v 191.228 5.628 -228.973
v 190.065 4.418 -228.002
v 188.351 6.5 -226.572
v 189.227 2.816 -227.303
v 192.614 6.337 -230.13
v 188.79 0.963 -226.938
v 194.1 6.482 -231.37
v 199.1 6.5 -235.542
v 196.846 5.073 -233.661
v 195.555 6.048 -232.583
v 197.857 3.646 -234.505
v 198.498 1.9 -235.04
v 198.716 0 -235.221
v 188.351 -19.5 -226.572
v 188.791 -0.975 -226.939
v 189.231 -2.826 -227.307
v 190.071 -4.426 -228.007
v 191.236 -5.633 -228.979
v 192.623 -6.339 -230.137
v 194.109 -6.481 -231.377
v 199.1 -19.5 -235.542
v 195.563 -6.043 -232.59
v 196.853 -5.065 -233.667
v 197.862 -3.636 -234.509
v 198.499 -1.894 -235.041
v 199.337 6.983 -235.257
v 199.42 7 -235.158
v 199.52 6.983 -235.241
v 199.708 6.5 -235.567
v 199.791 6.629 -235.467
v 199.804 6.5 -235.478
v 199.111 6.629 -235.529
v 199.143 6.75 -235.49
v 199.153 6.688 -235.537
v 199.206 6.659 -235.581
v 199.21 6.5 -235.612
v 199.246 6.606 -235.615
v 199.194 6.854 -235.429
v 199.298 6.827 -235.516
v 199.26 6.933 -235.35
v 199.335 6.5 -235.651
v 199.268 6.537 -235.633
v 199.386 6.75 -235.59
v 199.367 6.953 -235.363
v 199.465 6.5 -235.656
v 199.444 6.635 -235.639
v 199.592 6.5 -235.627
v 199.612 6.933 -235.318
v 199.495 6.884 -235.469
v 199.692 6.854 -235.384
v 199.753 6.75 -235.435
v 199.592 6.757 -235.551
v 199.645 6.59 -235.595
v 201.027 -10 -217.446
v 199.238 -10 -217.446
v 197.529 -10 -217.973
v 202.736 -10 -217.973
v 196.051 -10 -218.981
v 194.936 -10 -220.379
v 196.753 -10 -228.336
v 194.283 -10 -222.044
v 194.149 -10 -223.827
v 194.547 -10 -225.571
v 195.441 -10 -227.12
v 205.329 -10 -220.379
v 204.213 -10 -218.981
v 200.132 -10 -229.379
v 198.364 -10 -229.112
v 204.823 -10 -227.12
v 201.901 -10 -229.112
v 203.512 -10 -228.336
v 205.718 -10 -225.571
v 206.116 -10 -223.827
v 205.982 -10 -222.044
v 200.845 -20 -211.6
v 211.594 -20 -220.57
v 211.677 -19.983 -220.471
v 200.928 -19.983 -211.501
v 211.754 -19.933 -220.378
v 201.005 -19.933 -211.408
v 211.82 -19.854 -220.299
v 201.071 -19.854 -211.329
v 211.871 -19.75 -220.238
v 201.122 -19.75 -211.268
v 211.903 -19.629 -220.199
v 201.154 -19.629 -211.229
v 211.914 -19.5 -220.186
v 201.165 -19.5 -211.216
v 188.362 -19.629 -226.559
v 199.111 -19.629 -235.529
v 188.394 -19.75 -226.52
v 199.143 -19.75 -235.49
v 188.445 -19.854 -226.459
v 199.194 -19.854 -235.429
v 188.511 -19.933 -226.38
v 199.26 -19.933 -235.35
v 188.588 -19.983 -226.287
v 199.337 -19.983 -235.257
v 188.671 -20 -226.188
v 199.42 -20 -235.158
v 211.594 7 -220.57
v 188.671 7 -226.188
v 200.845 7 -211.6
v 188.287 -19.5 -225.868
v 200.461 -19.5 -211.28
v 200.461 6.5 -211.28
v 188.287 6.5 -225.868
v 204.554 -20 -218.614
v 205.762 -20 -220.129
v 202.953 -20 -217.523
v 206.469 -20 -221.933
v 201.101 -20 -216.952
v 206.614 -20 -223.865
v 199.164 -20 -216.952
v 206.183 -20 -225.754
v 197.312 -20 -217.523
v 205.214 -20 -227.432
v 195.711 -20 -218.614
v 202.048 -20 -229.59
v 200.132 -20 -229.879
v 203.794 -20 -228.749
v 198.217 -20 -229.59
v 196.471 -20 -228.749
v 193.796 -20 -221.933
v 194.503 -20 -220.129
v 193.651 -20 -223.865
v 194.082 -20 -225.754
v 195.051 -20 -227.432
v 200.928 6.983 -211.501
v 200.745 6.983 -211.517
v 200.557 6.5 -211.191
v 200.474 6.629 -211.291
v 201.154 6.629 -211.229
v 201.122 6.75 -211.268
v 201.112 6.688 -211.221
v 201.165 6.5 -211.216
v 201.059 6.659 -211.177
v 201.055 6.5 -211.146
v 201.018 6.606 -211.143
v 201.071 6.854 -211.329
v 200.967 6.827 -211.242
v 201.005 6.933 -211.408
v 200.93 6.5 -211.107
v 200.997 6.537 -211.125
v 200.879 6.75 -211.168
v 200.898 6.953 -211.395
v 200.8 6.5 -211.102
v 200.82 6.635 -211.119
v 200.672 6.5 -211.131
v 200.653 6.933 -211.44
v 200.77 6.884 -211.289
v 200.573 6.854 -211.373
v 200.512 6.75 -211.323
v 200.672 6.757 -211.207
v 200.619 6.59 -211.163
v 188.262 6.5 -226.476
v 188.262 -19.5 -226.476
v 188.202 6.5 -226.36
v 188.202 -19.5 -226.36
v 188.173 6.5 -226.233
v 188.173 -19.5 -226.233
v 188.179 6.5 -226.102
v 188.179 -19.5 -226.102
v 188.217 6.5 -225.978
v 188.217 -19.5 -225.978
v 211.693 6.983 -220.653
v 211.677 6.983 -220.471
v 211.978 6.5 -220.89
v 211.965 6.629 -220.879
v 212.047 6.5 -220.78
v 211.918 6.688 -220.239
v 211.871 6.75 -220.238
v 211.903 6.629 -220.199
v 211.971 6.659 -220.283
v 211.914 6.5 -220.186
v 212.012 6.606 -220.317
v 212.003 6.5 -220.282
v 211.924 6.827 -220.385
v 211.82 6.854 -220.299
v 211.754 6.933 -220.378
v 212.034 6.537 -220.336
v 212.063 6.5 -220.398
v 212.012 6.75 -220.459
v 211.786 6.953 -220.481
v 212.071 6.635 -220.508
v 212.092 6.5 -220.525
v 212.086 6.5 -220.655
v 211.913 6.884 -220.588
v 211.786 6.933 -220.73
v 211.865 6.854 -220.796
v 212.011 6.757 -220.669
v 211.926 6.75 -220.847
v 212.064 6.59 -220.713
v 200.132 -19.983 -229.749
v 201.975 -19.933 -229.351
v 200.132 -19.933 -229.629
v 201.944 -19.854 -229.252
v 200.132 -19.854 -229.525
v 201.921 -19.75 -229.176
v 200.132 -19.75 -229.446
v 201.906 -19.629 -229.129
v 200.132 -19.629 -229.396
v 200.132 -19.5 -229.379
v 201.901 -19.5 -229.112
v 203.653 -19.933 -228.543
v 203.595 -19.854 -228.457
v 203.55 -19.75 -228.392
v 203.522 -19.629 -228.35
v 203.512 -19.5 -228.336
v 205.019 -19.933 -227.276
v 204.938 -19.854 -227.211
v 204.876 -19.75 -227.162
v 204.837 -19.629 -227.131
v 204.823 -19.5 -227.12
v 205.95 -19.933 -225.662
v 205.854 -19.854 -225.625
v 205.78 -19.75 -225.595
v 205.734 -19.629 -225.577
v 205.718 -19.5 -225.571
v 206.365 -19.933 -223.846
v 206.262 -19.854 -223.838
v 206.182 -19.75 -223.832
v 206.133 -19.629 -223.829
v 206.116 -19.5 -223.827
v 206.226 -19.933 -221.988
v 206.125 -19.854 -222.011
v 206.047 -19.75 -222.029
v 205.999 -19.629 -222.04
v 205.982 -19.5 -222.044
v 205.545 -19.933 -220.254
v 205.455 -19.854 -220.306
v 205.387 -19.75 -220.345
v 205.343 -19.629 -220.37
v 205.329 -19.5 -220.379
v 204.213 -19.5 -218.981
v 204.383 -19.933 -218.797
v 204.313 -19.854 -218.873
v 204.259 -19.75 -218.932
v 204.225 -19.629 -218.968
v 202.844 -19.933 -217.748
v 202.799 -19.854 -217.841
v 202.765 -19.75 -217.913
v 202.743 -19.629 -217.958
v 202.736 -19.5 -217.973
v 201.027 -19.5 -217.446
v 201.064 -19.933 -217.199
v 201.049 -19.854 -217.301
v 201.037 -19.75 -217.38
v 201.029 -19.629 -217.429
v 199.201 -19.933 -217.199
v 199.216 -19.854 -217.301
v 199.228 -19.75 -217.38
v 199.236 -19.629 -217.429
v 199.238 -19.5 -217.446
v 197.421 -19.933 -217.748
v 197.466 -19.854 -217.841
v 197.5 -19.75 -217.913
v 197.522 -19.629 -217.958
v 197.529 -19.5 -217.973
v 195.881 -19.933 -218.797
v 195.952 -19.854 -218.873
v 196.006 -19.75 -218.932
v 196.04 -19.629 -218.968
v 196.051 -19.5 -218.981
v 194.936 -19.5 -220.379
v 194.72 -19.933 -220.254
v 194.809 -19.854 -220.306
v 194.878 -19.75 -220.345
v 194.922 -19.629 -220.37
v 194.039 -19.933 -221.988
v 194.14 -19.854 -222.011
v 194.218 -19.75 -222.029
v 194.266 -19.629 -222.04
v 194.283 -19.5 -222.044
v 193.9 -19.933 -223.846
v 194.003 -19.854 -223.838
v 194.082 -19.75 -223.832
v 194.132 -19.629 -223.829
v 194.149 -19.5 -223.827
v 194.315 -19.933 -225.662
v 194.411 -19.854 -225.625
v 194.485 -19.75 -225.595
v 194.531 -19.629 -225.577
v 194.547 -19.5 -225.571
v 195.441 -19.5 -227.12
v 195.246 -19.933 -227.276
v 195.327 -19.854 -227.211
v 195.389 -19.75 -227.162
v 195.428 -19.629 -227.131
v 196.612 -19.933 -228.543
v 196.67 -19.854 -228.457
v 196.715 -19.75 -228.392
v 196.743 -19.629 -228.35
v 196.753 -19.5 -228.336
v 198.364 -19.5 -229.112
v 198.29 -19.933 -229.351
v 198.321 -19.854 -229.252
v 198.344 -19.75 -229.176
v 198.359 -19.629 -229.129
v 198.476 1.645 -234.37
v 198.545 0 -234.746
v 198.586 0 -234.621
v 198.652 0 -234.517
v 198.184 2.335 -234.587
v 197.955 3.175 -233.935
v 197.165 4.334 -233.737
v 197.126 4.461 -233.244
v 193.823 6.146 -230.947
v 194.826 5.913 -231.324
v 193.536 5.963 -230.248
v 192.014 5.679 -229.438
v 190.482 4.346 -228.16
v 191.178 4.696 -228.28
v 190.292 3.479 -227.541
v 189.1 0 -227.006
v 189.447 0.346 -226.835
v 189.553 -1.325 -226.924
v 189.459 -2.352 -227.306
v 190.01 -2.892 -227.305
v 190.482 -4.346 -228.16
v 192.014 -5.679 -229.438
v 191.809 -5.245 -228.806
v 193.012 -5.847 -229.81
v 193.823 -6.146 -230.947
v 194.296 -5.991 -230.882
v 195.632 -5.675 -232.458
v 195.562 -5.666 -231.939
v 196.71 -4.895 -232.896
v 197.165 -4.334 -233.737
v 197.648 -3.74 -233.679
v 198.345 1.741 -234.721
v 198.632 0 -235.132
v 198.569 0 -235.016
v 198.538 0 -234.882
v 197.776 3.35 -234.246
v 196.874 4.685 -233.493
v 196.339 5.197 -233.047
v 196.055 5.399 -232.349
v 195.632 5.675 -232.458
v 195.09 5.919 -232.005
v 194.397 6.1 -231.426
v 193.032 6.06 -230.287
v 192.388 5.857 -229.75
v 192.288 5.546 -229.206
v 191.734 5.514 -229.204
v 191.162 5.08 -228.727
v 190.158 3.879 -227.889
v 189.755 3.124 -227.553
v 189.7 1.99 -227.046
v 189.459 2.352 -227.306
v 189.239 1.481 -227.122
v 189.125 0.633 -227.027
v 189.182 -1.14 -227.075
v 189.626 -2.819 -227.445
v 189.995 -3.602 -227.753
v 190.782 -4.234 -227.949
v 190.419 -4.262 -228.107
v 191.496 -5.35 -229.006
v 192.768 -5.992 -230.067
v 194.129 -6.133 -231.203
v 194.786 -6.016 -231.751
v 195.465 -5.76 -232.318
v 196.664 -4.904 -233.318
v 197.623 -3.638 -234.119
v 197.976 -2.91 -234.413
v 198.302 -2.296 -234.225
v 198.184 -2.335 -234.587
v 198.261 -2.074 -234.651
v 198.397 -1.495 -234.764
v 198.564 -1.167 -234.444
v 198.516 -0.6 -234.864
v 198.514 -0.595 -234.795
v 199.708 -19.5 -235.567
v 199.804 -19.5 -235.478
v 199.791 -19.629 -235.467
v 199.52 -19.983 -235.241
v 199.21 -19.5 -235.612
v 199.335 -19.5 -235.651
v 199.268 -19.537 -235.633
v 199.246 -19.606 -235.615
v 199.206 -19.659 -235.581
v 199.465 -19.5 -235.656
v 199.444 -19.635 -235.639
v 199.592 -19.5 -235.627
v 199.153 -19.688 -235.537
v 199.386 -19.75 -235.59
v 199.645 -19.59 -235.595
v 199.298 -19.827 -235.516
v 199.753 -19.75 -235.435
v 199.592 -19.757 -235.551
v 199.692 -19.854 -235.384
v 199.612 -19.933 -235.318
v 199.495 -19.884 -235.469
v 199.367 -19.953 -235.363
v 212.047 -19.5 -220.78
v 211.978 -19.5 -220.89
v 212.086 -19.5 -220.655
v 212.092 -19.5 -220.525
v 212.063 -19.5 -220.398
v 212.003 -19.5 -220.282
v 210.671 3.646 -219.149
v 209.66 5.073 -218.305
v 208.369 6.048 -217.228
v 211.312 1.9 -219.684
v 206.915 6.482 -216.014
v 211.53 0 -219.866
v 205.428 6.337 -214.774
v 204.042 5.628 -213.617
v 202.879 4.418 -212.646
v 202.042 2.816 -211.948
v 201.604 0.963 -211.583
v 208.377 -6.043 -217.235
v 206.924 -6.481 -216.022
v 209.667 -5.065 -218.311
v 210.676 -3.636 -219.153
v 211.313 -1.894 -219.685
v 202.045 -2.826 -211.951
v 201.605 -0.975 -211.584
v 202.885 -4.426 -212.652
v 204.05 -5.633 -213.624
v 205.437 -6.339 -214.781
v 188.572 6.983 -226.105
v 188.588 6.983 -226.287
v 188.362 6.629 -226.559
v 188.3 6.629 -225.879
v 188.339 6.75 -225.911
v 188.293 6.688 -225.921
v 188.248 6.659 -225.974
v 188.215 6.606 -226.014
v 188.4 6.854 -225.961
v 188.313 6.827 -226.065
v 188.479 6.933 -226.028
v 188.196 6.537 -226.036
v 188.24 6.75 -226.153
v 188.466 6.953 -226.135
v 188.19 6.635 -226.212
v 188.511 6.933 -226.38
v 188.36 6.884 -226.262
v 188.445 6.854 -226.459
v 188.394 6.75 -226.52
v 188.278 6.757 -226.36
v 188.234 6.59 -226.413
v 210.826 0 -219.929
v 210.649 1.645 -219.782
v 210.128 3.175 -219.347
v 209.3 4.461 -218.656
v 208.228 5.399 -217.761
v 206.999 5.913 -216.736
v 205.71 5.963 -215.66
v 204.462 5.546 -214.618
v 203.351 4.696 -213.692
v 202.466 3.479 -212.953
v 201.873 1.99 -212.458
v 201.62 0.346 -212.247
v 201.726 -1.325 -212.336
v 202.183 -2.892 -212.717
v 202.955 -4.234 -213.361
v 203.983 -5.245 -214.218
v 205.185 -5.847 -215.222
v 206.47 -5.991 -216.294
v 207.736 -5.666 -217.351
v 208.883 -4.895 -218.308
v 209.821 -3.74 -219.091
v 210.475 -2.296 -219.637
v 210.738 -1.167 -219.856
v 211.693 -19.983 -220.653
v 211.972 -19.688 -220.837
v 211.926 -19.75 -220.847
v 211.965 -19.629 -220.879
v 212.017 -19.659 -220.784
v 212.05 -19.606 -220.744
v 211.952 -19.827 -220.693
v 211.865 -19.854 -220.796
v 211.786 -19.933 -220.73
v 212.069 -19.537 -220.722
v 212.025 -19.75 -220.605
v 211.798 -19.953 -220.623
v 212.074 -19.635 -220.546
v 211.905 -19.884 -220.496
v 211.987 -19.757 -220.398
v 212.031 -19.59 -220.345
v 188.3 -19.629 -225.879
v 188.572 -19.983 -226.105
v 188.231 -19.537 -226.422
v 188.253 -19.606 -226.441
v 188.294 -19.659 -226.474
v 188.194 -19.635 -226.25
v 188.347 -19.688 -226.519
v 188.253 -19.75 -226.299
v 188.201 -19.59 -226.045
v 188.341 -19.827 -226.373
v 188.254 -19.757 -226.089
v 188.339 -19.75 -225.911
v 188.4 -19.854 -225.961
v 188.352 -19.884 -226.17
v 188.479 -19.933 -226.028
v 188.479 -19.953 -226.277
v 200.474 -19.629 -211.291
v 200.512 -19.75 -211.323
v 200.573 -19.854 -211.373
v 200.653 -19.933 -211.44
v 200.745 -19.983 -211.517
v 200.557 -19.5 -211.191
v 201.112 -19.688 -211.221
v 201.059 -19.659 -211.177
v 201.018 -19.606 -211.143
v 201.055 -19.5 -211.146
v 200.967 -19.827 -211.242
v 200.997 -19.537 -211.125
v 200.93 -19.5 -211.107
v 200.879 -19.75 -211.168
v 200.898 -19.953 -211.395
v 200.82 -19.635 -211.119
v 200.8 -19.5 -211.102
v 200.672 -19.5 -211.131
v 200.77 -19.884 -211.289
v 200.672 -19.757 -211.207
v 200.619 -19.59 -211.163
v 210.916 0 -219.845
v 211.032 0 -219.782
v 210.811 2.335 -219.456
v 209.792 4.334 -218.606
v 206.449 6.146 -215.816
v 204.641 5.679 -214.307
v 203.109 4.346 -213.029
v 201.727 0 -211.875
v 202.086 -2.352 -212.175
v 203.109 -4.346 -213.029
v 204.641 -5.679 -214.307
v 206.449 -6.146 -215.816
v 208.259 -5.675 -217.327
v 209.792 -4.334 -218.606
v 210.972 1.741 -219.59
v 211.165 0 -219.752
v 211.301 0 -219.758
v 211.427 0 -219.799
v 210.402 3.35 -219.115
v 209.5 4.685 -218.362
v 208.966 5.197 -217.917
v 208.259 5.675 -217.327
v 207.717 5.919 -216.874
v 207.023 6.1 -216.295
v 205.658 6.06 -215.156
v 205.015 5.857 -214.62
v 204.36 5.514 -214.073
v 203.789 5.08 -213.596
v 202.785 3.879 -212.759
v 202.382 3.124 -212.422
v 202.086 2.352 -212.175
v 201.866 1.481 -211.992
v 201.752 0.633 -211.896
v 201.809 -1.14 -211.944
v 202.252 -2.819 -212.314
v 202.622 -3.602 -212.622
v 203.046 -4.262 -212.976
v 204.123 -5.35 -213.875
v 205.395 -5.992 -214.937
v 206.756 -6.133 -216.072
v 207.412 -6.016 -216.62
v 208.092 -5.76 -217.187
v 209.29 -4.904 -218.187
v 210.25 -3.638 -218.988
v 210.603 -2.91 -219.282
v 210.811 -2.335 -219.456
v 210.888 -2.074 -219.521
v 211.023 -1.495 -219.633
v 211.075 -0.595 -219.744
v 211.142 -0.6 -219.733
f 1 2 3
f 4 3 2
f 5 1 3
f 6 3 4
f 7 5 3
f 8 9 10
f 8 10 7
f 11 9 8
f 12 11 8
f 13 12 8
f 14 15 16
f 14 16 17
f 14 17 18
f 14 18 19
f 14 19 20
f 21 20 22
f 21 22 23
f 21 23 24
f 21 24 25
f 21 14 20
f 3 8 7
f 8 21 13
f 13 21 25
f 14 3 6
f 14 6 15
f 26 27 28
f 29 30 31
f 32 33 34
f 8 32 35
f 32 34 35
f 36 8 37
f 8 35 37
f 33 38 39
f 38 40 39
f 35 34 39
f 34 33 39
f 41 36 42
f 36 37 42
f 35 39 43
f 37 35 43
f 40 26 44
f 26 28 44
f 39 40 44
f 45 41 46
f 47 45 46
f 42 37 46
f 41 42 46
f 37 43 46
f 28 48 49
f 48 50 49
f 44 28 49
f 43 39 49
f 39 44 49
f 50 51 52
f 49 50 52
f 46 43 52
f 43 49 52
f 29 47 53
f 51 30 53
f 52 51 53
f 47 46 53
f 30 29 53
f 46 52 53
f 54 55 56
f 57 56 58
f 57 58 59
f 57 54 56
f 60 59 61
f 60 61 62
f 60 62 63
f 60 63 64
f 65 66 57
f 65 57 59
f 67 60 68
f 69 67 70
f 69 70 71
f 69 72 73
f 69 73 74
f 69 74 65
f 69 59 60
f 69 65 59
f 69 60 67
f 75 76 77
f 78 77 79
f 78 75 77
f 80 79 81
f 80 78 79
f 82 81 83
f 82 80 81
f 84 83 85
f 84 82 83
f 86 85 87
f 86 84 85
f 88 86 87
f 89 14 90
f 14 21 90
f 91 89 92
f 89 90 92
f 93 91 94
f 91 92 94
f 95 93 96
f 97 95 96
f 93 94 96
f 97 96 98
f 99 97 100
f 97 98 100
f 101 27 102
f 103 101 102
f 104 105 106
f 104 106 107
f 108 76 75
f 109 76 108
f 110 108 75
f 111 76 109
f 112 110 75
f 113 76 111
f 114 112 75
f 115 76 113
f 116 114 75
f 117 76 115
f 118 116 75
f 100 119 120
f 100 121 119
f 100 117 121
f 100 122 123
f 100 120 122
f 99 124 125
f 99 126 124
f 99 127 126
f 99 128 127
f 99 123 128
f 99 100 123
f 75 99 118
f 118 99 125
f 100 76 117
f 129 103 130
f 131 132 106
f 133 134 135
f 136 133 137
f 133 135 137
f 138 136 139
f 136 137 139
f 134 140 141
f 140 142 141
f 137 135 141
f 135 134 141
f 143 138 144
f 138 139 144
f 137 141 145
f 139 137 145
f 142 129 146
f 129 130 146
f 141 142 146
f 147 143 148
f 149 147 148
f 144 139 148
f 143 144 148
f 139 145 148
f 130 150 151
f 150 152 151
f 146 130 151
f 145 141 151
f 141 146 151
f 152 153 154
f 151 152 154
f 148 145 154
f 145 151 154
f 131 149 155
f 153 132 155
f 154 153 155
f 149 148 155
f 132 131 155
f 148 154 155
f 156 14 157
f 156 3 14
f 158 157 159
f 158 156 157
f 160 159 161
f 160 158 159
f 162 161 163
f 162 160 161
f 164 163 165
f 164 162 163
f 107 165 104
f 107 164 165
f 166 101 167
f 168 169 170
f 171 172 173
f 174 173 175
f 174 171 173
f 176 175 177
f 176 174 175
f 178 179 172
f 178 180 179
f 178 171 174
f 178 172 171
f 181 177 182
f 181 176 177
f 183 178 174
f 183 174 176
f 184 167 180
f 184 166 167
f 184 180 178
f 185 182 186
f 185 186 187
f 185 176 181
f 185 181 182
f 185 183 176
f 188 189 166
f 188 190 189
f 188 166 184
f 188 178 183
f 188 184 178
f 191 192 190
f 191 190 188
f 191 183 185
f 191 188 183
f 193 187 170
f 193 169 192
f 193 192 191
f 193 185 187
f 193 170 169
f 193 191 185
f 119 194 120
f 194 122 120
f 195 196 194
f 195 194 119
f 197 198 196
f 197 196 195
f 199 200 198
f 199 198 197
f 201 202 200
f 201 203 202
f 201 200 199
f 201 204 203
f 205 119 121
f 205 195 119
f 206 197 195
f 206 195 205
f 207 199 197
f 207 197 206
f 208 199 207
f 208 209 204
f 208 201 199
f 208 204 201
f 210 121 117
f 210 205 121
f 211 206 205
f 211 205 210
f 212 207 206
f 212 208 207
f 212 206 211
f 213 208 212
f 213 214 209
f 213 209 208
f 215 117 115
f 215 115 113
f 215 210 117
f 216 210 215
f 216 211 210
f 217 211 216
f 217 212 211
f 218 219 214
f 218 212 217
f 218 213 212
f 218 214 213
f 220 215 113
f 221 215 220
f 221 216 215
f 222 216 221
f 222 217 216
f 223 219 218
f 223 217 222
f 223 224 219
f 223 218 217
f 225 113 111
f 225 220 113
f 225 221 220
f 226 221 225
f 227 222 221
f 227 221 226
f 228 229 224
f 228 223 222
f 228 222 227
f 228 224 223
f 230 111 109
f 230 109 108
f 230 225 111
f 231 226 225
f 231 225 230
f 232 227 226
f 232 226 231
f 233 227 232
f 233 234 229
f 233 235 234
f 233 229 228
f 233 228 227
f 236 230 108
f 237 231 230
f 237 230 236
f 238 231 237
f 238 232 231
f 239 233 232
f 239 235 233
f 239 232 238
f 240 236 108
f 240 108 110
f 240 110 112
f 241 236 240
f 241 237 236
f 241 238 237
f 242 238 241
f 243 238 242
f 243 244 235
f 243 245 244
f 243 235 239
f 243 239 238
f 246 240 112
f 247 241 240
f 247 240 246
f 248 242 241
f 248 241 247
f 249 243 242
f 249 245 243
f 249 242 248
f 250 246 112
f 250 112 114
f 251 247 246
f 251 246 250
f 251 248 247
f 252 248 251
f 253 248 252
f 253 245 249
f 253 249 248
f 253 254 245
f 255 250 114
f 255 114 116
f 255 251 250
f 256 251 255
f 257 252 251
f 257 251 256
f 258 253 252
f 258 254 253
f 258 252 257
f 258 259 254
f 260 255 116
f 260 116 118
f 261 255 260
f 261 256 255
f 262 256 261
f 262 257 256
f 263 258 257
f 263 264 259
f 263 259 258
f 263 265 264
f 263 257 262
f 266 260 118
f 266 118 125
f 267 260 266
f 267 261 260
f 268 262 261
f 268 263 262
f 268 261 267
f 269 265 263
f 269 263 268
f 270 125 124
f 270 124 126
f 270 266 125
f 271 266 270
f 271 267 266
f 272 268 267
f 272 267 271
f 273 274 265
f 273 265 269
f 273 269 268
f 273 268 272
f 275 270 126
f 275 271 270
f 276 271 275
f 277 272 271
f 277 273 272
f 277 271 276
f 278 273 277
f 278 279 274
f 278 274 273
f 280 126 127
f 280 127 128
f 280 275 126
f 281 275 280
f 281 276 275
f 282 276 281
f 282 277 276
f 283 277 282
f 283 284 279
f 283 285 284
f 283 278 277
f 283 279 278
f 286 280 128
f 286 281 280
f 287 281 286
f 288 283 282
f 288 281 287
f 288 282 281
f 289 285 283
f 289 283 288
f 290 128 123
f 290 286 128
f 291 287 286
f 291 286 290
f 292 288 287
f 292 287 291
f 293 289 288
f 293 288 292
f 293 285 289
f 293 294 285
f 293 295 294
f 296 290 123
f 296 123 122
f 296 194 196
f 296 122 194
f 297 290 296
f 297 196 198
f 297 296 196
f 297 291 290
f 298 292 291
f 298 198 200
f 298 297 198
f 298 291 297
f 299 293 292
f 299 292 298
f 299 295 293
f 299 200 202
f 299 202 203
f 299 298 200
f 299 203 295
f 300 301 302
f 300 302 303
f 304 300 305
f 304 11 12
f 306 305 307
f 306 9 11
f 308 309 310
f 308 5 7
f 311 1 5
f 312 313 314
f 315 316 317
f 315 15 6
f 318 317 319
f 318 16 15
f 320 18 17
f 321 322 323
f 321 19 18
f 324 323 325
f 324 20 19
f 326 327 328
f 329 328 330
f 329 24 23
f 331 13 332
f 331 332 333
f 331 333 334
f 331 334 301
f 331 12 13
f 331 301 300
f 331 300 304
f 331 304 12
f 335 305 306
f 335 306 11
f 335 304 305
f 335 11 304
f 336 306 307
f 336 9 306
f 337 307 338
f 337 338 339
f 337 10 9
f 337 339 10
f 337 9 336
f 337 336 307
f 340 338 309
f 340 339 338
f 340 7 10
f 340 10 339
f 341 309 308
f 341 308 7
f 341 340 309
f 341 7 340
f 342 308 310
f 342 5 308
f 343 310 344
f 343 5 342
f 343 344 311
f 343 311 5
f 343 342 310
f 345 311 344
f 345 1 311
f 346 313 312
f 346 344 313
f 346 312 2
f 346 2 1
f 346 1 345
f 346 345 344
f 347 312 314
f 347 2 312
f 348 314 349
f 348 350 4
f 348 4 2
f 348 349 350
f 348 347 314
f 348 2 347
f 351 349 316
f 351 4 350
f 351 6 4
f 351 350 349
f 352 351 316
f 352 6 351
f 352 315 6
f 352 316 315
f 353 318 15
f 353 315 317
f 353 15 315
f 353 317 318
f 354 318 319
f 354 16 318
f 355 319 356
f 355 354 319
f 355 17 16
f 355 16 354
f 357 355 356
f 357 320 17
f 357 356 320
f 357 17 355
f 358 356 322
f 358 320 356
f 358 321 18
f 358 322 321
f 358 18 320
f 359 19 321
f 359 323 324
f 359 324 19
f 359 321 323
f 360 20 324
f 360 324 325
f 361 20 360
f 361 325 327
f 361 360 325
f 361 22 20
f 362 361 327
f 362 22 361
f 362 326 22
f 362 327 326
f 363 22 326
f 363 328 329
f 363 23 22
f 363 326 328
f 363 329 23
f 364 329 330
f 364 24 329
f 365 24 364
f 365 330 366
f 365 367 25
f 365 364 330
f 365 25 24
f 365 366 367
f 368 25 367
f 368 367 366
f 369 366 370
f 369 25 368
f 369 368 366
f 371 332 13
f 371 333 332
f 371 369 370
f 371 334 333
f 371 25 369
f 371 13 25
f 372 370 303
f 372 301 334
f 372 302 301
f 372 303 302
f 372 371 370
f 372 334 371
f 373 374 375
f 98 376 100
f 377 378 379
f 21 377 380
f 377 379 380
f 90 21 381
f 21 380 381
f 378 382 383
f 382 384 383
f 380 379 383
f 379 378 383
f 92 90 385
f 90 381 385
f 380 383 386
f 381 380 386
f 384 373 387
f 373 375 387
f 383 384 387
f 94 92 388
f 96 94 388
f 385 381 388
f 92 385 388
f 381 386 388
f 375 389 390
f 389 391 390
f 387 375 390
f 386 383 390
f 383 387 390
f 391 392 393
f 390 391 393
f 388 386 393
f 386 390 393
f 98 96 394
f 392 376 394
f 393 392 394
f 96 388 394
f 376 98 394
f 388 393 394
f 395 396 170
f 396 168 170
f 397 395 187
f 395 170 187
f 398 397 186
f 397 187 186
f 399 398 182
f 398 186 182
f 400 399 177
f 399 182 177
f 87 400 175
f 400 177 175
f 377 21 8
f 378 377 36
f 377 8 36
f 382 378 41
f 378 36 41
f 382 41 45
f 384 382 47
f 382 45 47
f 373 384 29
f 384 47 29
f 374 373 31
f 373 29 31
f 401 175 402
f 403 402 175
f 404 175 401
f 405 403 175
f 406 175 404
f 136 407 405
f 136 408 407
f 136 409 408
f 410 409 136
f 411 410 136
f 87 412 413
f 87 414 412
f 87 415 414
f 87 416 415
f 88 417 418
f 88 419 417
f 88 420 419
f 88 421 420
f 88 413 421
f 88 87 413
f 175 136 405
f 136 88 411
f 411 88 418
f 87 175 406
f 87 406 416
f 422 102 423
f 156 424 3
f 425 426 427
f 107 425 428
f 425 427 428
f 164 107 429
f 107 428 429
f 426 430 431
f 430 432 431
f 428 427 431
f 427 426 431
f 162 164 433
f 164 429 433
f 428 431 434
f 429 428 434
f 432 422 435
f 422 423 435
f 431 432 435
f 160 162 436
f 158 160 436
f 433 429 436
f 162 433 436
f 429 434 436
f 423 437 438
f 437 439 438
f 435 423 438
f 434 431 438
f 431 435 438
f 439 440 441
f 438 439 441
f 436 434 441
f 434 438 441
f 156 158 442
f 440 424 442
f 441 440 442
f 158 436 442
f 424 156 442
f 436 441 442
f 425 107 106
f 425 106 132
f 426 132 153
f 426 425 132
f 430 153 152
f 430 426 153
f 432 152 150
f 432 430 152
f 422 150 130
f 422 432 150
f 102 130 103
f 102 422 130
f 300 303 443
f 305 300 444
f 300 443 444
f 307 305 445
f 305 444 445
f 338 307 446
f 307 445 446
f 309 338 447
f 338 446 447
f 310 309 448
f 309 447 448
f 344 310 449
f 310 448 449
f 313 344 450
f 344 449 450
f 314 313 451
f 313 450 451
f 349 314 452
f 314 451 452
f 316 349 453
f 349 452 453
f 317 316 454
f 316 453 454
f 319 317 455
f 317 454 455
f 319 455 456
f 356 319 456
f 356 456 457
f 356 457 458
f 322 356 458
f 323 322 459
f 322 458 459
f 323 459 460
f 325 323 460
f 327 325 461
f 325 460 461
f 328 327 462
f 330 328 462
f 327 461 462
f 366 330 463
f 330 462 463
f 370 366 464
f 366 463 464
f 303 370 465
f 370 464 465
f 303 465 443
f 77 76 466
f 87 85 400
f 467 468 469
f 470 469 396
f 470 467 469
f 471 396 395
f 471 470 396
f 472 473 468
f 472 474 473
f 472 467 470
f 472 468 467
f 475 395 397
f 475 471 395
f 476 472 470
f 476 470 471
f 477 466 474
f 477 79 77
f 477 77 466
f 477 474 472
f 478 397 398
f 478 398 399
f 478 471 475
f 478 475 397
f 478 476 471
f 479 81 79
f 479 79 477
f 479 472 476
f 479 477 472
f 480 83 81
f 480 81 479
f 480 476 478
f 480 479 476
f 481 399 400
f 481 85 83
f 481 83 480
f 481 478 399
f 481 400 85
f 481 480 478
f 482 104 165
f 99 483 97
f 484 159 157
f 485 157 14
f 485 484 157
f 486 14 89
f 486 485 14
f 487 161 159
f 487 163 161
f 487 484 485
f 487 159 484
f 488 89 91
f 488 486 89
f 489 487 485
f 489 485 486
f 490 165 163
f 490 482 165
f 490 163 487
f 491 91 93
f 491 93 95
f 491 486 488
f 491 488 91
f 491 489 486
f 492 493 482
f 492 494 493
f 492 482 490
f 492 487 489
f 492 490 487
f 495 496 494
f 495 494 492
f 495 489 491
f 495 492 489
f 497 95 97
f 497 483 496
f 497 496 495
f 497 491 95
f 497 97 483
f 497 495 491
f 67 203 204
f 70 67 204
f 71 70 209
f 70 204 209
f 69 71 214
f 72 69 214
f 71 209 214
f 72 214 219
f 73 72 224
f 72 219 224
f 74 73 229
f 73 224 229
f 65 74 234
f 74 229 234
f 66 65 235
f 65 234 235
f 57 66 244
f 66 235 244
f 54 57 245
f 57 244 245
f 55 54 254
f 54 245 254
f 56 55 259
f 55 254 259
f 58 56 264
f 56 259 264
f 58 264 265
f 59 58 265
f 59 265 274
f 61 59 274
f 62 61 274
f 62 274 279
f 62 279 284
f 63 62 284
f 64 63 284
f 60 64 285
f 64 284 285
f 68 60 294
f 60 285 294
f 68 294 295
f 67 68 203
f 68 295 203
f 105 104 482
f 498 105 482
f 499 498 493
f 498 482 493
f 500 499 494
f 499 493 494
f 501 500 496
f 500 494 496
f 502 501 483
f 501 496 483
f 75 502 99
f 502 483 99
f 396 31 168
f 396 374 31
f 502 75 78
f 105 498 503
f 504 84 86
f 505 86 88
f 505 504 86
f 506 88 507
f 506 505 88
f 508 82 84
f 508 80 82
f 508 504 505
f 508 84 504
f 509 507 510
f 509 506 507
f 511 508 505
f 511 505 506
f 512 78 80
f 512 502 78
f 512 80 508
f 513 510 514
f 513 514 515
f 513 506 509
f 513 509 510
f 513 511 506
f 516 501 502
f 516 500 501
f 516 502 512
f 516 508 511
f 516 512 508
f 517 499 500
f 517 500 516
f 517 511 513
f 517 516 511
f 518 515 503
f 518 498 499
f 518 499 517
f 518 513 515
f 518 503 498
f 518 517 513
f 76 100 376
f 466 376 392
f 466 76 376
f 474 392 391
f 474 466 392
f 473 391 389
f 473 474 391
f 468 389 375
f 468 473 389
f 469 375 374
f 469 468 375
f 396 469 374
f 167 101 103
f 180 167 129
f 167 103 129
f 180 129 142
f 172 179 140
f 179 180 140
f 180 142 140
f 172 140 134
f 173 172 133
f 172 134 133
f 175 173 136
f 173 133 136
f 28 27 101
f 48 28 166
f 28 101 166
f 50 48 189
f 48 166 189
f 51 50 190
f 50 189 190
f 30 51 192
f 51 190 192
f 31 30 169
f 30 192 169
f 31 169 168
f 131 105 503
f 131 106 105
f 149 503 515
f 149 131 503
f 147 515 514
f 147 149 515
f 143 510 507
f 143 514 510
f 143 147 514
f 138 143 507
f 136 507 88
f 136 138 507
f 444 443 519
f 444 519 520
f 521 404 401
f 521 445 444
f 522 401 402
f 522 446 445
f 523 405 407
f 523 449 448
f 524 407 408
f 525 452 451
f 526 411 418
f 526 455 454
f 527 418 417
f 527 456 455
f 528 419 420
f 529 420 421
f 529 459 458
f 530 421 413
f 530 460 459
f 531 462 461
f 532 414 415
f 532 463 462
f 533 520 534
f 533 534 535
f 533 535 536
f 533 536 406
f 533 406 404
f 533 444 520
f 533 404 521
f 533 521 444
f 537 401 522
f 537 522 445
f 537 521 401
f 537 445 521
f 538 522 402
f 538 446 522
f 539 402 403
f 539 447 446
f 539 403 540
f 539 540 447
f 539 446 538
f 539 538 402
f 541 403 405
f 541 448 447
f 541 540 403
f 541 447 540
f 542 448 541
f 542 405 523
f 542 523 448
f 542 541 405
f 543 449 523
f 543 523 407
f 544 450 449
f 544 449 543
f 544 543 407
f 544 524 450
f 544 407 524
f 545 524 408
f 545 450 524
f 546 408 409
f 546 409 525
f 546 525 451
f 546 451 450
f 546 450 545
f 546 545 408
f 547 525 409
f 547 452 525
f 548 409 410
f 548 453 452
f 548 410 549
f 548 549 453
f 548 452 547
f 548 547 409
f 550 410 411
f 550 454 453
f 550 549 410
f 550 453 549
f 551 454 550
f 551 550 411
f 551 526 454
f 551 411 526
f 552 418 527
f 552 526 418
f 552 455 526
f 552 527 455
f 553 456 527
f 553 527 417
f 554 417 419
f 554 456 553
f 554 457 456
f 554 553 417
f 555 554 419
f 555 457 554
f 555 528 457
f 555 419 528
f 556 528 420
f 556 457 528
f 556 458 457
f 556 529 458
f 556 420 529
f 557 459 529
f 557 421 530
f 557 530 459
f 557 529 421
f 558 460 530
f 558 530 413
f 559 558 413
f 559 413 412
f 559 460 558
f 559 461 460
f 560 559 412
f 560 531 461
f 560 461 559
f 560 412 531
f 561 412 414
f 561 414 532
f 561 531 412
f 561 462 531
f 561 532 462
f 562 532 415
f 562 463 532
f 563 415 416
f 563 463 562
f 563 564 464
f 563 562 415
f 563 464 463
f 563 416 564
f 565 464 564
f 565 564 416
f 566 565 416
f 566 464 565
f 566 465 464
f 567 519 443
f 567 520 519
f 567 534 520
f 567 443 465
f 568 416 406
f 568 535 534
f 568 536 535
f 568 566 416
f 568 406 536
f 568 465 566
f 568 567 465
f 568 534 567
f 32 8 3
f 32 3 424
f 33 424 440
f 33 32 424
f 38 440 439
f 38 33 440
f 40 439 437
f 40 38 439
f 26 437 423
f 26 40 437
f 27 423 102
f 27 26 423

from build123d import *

# Parameters (mm, degrees)
BOSS_EXTRUDE1_DEPTH      = 7
BOSS_EXTRUDE1_DEPTH_BACK = 20
SKETCH28_R               = 6
CUT_EXTRUDE1_DEPTH       = 10
CUT_SWEEP1_PROFILE_R     = 6
FILLET1_R                = 0.5


with BuildPart() as part:
    # Sketch27 → Boss-Extrude1 (new, two sides: drawn at the far end of the back side and taken through both)
    with BuildSketch(Plane(origin=(0, 0, 0), x_dir=(1, 0, 0), z_dir=(0, 1, 0)).offset(-BOSS_EXTRUDE1_DEPTH_BACK)):
        Polygon((187.966972175, 226.25146795), (199.483711764, 235.862123975), (212.297919797, 220.506471189), (200.781180208, 210.895815164), align=None)
    extrude(amount=BOSS_EXTRUDE1_DEPTH + BOSS_EXTRUDE1_DEPTH_BACK)

    # Sketch28 → Cut-Extrude1 (cut)
    with BuildSketch(Plane.XZ.offset(20)):
        with Locations(Location((200.132445986, -223.37896957, 0), (0, 0, 270))):
            Circle(SKETCH28_R)
    extrude(amount=-CUT_EXTRUDE1_DEPTH, mode=Mode.SUBTRACT)

    # Cut-Sweep1: sweep along a path in Sketch19
    with BuildLine(Plane(origin=(0, 0, 0), x_dir=(1, 0, 0), z_dir=(0, 1, 0))) as cut_sweep1_path:
        Line((128.459886798, 309.266363493), (271.805005174, 137.491575647))
    # Cut-Sweep1 profile (on start of the path) → Cut-Sweep1 (sweep, cut)
    with BuildSketch(Plane(origin=(128.459886798, 0, -309.266363493), x_dir=(0.767782639292157, 0, -0.6407104016648784), z_dir=(0.6407104016648784, 0, 0.767782639292157))):
        Circle(CUT_SWEEP1_PROFILE_R)
    sweep(path=cut_sweep1_path.line, mode=Mode.SUBTRACT)

    # Fillet1
    fillet1_edges = [part.edges().sort_by_distance(p)[0] for p in [
        (205.890815781, 7, -228.184297582),
        (194.374076191, -20, -218.573641557),
        (193.725341969, 7, -231.056795963),
        (194.374076191, 7, -218.573641557),
        (206.539550003, 7, -215.701143177),
        (206.539550003, -20, -215.701143177),
        (200.132445986, -20, -217.37896957),
        (201.932854167, 0, -211.856880767),
        (189.118646134, 0, -227.212533553),
        (205.890815781, -20, -228.184297582),
        (212.297919797, -6.5, -220.506471189),
        (200.781180208, -6.5, -210.895815164),
        (187.966972175, -6.5, -226.25146795),
        (199.483711764, -6.5, -235.862123975),
        (193.725341969, -20, -231.056795963),
    ]]
    fillet(fillet1_edges, radius=FILLET1_R - 0.0001)  # a hair under: the kernel refuses the full size


solid = part.part
